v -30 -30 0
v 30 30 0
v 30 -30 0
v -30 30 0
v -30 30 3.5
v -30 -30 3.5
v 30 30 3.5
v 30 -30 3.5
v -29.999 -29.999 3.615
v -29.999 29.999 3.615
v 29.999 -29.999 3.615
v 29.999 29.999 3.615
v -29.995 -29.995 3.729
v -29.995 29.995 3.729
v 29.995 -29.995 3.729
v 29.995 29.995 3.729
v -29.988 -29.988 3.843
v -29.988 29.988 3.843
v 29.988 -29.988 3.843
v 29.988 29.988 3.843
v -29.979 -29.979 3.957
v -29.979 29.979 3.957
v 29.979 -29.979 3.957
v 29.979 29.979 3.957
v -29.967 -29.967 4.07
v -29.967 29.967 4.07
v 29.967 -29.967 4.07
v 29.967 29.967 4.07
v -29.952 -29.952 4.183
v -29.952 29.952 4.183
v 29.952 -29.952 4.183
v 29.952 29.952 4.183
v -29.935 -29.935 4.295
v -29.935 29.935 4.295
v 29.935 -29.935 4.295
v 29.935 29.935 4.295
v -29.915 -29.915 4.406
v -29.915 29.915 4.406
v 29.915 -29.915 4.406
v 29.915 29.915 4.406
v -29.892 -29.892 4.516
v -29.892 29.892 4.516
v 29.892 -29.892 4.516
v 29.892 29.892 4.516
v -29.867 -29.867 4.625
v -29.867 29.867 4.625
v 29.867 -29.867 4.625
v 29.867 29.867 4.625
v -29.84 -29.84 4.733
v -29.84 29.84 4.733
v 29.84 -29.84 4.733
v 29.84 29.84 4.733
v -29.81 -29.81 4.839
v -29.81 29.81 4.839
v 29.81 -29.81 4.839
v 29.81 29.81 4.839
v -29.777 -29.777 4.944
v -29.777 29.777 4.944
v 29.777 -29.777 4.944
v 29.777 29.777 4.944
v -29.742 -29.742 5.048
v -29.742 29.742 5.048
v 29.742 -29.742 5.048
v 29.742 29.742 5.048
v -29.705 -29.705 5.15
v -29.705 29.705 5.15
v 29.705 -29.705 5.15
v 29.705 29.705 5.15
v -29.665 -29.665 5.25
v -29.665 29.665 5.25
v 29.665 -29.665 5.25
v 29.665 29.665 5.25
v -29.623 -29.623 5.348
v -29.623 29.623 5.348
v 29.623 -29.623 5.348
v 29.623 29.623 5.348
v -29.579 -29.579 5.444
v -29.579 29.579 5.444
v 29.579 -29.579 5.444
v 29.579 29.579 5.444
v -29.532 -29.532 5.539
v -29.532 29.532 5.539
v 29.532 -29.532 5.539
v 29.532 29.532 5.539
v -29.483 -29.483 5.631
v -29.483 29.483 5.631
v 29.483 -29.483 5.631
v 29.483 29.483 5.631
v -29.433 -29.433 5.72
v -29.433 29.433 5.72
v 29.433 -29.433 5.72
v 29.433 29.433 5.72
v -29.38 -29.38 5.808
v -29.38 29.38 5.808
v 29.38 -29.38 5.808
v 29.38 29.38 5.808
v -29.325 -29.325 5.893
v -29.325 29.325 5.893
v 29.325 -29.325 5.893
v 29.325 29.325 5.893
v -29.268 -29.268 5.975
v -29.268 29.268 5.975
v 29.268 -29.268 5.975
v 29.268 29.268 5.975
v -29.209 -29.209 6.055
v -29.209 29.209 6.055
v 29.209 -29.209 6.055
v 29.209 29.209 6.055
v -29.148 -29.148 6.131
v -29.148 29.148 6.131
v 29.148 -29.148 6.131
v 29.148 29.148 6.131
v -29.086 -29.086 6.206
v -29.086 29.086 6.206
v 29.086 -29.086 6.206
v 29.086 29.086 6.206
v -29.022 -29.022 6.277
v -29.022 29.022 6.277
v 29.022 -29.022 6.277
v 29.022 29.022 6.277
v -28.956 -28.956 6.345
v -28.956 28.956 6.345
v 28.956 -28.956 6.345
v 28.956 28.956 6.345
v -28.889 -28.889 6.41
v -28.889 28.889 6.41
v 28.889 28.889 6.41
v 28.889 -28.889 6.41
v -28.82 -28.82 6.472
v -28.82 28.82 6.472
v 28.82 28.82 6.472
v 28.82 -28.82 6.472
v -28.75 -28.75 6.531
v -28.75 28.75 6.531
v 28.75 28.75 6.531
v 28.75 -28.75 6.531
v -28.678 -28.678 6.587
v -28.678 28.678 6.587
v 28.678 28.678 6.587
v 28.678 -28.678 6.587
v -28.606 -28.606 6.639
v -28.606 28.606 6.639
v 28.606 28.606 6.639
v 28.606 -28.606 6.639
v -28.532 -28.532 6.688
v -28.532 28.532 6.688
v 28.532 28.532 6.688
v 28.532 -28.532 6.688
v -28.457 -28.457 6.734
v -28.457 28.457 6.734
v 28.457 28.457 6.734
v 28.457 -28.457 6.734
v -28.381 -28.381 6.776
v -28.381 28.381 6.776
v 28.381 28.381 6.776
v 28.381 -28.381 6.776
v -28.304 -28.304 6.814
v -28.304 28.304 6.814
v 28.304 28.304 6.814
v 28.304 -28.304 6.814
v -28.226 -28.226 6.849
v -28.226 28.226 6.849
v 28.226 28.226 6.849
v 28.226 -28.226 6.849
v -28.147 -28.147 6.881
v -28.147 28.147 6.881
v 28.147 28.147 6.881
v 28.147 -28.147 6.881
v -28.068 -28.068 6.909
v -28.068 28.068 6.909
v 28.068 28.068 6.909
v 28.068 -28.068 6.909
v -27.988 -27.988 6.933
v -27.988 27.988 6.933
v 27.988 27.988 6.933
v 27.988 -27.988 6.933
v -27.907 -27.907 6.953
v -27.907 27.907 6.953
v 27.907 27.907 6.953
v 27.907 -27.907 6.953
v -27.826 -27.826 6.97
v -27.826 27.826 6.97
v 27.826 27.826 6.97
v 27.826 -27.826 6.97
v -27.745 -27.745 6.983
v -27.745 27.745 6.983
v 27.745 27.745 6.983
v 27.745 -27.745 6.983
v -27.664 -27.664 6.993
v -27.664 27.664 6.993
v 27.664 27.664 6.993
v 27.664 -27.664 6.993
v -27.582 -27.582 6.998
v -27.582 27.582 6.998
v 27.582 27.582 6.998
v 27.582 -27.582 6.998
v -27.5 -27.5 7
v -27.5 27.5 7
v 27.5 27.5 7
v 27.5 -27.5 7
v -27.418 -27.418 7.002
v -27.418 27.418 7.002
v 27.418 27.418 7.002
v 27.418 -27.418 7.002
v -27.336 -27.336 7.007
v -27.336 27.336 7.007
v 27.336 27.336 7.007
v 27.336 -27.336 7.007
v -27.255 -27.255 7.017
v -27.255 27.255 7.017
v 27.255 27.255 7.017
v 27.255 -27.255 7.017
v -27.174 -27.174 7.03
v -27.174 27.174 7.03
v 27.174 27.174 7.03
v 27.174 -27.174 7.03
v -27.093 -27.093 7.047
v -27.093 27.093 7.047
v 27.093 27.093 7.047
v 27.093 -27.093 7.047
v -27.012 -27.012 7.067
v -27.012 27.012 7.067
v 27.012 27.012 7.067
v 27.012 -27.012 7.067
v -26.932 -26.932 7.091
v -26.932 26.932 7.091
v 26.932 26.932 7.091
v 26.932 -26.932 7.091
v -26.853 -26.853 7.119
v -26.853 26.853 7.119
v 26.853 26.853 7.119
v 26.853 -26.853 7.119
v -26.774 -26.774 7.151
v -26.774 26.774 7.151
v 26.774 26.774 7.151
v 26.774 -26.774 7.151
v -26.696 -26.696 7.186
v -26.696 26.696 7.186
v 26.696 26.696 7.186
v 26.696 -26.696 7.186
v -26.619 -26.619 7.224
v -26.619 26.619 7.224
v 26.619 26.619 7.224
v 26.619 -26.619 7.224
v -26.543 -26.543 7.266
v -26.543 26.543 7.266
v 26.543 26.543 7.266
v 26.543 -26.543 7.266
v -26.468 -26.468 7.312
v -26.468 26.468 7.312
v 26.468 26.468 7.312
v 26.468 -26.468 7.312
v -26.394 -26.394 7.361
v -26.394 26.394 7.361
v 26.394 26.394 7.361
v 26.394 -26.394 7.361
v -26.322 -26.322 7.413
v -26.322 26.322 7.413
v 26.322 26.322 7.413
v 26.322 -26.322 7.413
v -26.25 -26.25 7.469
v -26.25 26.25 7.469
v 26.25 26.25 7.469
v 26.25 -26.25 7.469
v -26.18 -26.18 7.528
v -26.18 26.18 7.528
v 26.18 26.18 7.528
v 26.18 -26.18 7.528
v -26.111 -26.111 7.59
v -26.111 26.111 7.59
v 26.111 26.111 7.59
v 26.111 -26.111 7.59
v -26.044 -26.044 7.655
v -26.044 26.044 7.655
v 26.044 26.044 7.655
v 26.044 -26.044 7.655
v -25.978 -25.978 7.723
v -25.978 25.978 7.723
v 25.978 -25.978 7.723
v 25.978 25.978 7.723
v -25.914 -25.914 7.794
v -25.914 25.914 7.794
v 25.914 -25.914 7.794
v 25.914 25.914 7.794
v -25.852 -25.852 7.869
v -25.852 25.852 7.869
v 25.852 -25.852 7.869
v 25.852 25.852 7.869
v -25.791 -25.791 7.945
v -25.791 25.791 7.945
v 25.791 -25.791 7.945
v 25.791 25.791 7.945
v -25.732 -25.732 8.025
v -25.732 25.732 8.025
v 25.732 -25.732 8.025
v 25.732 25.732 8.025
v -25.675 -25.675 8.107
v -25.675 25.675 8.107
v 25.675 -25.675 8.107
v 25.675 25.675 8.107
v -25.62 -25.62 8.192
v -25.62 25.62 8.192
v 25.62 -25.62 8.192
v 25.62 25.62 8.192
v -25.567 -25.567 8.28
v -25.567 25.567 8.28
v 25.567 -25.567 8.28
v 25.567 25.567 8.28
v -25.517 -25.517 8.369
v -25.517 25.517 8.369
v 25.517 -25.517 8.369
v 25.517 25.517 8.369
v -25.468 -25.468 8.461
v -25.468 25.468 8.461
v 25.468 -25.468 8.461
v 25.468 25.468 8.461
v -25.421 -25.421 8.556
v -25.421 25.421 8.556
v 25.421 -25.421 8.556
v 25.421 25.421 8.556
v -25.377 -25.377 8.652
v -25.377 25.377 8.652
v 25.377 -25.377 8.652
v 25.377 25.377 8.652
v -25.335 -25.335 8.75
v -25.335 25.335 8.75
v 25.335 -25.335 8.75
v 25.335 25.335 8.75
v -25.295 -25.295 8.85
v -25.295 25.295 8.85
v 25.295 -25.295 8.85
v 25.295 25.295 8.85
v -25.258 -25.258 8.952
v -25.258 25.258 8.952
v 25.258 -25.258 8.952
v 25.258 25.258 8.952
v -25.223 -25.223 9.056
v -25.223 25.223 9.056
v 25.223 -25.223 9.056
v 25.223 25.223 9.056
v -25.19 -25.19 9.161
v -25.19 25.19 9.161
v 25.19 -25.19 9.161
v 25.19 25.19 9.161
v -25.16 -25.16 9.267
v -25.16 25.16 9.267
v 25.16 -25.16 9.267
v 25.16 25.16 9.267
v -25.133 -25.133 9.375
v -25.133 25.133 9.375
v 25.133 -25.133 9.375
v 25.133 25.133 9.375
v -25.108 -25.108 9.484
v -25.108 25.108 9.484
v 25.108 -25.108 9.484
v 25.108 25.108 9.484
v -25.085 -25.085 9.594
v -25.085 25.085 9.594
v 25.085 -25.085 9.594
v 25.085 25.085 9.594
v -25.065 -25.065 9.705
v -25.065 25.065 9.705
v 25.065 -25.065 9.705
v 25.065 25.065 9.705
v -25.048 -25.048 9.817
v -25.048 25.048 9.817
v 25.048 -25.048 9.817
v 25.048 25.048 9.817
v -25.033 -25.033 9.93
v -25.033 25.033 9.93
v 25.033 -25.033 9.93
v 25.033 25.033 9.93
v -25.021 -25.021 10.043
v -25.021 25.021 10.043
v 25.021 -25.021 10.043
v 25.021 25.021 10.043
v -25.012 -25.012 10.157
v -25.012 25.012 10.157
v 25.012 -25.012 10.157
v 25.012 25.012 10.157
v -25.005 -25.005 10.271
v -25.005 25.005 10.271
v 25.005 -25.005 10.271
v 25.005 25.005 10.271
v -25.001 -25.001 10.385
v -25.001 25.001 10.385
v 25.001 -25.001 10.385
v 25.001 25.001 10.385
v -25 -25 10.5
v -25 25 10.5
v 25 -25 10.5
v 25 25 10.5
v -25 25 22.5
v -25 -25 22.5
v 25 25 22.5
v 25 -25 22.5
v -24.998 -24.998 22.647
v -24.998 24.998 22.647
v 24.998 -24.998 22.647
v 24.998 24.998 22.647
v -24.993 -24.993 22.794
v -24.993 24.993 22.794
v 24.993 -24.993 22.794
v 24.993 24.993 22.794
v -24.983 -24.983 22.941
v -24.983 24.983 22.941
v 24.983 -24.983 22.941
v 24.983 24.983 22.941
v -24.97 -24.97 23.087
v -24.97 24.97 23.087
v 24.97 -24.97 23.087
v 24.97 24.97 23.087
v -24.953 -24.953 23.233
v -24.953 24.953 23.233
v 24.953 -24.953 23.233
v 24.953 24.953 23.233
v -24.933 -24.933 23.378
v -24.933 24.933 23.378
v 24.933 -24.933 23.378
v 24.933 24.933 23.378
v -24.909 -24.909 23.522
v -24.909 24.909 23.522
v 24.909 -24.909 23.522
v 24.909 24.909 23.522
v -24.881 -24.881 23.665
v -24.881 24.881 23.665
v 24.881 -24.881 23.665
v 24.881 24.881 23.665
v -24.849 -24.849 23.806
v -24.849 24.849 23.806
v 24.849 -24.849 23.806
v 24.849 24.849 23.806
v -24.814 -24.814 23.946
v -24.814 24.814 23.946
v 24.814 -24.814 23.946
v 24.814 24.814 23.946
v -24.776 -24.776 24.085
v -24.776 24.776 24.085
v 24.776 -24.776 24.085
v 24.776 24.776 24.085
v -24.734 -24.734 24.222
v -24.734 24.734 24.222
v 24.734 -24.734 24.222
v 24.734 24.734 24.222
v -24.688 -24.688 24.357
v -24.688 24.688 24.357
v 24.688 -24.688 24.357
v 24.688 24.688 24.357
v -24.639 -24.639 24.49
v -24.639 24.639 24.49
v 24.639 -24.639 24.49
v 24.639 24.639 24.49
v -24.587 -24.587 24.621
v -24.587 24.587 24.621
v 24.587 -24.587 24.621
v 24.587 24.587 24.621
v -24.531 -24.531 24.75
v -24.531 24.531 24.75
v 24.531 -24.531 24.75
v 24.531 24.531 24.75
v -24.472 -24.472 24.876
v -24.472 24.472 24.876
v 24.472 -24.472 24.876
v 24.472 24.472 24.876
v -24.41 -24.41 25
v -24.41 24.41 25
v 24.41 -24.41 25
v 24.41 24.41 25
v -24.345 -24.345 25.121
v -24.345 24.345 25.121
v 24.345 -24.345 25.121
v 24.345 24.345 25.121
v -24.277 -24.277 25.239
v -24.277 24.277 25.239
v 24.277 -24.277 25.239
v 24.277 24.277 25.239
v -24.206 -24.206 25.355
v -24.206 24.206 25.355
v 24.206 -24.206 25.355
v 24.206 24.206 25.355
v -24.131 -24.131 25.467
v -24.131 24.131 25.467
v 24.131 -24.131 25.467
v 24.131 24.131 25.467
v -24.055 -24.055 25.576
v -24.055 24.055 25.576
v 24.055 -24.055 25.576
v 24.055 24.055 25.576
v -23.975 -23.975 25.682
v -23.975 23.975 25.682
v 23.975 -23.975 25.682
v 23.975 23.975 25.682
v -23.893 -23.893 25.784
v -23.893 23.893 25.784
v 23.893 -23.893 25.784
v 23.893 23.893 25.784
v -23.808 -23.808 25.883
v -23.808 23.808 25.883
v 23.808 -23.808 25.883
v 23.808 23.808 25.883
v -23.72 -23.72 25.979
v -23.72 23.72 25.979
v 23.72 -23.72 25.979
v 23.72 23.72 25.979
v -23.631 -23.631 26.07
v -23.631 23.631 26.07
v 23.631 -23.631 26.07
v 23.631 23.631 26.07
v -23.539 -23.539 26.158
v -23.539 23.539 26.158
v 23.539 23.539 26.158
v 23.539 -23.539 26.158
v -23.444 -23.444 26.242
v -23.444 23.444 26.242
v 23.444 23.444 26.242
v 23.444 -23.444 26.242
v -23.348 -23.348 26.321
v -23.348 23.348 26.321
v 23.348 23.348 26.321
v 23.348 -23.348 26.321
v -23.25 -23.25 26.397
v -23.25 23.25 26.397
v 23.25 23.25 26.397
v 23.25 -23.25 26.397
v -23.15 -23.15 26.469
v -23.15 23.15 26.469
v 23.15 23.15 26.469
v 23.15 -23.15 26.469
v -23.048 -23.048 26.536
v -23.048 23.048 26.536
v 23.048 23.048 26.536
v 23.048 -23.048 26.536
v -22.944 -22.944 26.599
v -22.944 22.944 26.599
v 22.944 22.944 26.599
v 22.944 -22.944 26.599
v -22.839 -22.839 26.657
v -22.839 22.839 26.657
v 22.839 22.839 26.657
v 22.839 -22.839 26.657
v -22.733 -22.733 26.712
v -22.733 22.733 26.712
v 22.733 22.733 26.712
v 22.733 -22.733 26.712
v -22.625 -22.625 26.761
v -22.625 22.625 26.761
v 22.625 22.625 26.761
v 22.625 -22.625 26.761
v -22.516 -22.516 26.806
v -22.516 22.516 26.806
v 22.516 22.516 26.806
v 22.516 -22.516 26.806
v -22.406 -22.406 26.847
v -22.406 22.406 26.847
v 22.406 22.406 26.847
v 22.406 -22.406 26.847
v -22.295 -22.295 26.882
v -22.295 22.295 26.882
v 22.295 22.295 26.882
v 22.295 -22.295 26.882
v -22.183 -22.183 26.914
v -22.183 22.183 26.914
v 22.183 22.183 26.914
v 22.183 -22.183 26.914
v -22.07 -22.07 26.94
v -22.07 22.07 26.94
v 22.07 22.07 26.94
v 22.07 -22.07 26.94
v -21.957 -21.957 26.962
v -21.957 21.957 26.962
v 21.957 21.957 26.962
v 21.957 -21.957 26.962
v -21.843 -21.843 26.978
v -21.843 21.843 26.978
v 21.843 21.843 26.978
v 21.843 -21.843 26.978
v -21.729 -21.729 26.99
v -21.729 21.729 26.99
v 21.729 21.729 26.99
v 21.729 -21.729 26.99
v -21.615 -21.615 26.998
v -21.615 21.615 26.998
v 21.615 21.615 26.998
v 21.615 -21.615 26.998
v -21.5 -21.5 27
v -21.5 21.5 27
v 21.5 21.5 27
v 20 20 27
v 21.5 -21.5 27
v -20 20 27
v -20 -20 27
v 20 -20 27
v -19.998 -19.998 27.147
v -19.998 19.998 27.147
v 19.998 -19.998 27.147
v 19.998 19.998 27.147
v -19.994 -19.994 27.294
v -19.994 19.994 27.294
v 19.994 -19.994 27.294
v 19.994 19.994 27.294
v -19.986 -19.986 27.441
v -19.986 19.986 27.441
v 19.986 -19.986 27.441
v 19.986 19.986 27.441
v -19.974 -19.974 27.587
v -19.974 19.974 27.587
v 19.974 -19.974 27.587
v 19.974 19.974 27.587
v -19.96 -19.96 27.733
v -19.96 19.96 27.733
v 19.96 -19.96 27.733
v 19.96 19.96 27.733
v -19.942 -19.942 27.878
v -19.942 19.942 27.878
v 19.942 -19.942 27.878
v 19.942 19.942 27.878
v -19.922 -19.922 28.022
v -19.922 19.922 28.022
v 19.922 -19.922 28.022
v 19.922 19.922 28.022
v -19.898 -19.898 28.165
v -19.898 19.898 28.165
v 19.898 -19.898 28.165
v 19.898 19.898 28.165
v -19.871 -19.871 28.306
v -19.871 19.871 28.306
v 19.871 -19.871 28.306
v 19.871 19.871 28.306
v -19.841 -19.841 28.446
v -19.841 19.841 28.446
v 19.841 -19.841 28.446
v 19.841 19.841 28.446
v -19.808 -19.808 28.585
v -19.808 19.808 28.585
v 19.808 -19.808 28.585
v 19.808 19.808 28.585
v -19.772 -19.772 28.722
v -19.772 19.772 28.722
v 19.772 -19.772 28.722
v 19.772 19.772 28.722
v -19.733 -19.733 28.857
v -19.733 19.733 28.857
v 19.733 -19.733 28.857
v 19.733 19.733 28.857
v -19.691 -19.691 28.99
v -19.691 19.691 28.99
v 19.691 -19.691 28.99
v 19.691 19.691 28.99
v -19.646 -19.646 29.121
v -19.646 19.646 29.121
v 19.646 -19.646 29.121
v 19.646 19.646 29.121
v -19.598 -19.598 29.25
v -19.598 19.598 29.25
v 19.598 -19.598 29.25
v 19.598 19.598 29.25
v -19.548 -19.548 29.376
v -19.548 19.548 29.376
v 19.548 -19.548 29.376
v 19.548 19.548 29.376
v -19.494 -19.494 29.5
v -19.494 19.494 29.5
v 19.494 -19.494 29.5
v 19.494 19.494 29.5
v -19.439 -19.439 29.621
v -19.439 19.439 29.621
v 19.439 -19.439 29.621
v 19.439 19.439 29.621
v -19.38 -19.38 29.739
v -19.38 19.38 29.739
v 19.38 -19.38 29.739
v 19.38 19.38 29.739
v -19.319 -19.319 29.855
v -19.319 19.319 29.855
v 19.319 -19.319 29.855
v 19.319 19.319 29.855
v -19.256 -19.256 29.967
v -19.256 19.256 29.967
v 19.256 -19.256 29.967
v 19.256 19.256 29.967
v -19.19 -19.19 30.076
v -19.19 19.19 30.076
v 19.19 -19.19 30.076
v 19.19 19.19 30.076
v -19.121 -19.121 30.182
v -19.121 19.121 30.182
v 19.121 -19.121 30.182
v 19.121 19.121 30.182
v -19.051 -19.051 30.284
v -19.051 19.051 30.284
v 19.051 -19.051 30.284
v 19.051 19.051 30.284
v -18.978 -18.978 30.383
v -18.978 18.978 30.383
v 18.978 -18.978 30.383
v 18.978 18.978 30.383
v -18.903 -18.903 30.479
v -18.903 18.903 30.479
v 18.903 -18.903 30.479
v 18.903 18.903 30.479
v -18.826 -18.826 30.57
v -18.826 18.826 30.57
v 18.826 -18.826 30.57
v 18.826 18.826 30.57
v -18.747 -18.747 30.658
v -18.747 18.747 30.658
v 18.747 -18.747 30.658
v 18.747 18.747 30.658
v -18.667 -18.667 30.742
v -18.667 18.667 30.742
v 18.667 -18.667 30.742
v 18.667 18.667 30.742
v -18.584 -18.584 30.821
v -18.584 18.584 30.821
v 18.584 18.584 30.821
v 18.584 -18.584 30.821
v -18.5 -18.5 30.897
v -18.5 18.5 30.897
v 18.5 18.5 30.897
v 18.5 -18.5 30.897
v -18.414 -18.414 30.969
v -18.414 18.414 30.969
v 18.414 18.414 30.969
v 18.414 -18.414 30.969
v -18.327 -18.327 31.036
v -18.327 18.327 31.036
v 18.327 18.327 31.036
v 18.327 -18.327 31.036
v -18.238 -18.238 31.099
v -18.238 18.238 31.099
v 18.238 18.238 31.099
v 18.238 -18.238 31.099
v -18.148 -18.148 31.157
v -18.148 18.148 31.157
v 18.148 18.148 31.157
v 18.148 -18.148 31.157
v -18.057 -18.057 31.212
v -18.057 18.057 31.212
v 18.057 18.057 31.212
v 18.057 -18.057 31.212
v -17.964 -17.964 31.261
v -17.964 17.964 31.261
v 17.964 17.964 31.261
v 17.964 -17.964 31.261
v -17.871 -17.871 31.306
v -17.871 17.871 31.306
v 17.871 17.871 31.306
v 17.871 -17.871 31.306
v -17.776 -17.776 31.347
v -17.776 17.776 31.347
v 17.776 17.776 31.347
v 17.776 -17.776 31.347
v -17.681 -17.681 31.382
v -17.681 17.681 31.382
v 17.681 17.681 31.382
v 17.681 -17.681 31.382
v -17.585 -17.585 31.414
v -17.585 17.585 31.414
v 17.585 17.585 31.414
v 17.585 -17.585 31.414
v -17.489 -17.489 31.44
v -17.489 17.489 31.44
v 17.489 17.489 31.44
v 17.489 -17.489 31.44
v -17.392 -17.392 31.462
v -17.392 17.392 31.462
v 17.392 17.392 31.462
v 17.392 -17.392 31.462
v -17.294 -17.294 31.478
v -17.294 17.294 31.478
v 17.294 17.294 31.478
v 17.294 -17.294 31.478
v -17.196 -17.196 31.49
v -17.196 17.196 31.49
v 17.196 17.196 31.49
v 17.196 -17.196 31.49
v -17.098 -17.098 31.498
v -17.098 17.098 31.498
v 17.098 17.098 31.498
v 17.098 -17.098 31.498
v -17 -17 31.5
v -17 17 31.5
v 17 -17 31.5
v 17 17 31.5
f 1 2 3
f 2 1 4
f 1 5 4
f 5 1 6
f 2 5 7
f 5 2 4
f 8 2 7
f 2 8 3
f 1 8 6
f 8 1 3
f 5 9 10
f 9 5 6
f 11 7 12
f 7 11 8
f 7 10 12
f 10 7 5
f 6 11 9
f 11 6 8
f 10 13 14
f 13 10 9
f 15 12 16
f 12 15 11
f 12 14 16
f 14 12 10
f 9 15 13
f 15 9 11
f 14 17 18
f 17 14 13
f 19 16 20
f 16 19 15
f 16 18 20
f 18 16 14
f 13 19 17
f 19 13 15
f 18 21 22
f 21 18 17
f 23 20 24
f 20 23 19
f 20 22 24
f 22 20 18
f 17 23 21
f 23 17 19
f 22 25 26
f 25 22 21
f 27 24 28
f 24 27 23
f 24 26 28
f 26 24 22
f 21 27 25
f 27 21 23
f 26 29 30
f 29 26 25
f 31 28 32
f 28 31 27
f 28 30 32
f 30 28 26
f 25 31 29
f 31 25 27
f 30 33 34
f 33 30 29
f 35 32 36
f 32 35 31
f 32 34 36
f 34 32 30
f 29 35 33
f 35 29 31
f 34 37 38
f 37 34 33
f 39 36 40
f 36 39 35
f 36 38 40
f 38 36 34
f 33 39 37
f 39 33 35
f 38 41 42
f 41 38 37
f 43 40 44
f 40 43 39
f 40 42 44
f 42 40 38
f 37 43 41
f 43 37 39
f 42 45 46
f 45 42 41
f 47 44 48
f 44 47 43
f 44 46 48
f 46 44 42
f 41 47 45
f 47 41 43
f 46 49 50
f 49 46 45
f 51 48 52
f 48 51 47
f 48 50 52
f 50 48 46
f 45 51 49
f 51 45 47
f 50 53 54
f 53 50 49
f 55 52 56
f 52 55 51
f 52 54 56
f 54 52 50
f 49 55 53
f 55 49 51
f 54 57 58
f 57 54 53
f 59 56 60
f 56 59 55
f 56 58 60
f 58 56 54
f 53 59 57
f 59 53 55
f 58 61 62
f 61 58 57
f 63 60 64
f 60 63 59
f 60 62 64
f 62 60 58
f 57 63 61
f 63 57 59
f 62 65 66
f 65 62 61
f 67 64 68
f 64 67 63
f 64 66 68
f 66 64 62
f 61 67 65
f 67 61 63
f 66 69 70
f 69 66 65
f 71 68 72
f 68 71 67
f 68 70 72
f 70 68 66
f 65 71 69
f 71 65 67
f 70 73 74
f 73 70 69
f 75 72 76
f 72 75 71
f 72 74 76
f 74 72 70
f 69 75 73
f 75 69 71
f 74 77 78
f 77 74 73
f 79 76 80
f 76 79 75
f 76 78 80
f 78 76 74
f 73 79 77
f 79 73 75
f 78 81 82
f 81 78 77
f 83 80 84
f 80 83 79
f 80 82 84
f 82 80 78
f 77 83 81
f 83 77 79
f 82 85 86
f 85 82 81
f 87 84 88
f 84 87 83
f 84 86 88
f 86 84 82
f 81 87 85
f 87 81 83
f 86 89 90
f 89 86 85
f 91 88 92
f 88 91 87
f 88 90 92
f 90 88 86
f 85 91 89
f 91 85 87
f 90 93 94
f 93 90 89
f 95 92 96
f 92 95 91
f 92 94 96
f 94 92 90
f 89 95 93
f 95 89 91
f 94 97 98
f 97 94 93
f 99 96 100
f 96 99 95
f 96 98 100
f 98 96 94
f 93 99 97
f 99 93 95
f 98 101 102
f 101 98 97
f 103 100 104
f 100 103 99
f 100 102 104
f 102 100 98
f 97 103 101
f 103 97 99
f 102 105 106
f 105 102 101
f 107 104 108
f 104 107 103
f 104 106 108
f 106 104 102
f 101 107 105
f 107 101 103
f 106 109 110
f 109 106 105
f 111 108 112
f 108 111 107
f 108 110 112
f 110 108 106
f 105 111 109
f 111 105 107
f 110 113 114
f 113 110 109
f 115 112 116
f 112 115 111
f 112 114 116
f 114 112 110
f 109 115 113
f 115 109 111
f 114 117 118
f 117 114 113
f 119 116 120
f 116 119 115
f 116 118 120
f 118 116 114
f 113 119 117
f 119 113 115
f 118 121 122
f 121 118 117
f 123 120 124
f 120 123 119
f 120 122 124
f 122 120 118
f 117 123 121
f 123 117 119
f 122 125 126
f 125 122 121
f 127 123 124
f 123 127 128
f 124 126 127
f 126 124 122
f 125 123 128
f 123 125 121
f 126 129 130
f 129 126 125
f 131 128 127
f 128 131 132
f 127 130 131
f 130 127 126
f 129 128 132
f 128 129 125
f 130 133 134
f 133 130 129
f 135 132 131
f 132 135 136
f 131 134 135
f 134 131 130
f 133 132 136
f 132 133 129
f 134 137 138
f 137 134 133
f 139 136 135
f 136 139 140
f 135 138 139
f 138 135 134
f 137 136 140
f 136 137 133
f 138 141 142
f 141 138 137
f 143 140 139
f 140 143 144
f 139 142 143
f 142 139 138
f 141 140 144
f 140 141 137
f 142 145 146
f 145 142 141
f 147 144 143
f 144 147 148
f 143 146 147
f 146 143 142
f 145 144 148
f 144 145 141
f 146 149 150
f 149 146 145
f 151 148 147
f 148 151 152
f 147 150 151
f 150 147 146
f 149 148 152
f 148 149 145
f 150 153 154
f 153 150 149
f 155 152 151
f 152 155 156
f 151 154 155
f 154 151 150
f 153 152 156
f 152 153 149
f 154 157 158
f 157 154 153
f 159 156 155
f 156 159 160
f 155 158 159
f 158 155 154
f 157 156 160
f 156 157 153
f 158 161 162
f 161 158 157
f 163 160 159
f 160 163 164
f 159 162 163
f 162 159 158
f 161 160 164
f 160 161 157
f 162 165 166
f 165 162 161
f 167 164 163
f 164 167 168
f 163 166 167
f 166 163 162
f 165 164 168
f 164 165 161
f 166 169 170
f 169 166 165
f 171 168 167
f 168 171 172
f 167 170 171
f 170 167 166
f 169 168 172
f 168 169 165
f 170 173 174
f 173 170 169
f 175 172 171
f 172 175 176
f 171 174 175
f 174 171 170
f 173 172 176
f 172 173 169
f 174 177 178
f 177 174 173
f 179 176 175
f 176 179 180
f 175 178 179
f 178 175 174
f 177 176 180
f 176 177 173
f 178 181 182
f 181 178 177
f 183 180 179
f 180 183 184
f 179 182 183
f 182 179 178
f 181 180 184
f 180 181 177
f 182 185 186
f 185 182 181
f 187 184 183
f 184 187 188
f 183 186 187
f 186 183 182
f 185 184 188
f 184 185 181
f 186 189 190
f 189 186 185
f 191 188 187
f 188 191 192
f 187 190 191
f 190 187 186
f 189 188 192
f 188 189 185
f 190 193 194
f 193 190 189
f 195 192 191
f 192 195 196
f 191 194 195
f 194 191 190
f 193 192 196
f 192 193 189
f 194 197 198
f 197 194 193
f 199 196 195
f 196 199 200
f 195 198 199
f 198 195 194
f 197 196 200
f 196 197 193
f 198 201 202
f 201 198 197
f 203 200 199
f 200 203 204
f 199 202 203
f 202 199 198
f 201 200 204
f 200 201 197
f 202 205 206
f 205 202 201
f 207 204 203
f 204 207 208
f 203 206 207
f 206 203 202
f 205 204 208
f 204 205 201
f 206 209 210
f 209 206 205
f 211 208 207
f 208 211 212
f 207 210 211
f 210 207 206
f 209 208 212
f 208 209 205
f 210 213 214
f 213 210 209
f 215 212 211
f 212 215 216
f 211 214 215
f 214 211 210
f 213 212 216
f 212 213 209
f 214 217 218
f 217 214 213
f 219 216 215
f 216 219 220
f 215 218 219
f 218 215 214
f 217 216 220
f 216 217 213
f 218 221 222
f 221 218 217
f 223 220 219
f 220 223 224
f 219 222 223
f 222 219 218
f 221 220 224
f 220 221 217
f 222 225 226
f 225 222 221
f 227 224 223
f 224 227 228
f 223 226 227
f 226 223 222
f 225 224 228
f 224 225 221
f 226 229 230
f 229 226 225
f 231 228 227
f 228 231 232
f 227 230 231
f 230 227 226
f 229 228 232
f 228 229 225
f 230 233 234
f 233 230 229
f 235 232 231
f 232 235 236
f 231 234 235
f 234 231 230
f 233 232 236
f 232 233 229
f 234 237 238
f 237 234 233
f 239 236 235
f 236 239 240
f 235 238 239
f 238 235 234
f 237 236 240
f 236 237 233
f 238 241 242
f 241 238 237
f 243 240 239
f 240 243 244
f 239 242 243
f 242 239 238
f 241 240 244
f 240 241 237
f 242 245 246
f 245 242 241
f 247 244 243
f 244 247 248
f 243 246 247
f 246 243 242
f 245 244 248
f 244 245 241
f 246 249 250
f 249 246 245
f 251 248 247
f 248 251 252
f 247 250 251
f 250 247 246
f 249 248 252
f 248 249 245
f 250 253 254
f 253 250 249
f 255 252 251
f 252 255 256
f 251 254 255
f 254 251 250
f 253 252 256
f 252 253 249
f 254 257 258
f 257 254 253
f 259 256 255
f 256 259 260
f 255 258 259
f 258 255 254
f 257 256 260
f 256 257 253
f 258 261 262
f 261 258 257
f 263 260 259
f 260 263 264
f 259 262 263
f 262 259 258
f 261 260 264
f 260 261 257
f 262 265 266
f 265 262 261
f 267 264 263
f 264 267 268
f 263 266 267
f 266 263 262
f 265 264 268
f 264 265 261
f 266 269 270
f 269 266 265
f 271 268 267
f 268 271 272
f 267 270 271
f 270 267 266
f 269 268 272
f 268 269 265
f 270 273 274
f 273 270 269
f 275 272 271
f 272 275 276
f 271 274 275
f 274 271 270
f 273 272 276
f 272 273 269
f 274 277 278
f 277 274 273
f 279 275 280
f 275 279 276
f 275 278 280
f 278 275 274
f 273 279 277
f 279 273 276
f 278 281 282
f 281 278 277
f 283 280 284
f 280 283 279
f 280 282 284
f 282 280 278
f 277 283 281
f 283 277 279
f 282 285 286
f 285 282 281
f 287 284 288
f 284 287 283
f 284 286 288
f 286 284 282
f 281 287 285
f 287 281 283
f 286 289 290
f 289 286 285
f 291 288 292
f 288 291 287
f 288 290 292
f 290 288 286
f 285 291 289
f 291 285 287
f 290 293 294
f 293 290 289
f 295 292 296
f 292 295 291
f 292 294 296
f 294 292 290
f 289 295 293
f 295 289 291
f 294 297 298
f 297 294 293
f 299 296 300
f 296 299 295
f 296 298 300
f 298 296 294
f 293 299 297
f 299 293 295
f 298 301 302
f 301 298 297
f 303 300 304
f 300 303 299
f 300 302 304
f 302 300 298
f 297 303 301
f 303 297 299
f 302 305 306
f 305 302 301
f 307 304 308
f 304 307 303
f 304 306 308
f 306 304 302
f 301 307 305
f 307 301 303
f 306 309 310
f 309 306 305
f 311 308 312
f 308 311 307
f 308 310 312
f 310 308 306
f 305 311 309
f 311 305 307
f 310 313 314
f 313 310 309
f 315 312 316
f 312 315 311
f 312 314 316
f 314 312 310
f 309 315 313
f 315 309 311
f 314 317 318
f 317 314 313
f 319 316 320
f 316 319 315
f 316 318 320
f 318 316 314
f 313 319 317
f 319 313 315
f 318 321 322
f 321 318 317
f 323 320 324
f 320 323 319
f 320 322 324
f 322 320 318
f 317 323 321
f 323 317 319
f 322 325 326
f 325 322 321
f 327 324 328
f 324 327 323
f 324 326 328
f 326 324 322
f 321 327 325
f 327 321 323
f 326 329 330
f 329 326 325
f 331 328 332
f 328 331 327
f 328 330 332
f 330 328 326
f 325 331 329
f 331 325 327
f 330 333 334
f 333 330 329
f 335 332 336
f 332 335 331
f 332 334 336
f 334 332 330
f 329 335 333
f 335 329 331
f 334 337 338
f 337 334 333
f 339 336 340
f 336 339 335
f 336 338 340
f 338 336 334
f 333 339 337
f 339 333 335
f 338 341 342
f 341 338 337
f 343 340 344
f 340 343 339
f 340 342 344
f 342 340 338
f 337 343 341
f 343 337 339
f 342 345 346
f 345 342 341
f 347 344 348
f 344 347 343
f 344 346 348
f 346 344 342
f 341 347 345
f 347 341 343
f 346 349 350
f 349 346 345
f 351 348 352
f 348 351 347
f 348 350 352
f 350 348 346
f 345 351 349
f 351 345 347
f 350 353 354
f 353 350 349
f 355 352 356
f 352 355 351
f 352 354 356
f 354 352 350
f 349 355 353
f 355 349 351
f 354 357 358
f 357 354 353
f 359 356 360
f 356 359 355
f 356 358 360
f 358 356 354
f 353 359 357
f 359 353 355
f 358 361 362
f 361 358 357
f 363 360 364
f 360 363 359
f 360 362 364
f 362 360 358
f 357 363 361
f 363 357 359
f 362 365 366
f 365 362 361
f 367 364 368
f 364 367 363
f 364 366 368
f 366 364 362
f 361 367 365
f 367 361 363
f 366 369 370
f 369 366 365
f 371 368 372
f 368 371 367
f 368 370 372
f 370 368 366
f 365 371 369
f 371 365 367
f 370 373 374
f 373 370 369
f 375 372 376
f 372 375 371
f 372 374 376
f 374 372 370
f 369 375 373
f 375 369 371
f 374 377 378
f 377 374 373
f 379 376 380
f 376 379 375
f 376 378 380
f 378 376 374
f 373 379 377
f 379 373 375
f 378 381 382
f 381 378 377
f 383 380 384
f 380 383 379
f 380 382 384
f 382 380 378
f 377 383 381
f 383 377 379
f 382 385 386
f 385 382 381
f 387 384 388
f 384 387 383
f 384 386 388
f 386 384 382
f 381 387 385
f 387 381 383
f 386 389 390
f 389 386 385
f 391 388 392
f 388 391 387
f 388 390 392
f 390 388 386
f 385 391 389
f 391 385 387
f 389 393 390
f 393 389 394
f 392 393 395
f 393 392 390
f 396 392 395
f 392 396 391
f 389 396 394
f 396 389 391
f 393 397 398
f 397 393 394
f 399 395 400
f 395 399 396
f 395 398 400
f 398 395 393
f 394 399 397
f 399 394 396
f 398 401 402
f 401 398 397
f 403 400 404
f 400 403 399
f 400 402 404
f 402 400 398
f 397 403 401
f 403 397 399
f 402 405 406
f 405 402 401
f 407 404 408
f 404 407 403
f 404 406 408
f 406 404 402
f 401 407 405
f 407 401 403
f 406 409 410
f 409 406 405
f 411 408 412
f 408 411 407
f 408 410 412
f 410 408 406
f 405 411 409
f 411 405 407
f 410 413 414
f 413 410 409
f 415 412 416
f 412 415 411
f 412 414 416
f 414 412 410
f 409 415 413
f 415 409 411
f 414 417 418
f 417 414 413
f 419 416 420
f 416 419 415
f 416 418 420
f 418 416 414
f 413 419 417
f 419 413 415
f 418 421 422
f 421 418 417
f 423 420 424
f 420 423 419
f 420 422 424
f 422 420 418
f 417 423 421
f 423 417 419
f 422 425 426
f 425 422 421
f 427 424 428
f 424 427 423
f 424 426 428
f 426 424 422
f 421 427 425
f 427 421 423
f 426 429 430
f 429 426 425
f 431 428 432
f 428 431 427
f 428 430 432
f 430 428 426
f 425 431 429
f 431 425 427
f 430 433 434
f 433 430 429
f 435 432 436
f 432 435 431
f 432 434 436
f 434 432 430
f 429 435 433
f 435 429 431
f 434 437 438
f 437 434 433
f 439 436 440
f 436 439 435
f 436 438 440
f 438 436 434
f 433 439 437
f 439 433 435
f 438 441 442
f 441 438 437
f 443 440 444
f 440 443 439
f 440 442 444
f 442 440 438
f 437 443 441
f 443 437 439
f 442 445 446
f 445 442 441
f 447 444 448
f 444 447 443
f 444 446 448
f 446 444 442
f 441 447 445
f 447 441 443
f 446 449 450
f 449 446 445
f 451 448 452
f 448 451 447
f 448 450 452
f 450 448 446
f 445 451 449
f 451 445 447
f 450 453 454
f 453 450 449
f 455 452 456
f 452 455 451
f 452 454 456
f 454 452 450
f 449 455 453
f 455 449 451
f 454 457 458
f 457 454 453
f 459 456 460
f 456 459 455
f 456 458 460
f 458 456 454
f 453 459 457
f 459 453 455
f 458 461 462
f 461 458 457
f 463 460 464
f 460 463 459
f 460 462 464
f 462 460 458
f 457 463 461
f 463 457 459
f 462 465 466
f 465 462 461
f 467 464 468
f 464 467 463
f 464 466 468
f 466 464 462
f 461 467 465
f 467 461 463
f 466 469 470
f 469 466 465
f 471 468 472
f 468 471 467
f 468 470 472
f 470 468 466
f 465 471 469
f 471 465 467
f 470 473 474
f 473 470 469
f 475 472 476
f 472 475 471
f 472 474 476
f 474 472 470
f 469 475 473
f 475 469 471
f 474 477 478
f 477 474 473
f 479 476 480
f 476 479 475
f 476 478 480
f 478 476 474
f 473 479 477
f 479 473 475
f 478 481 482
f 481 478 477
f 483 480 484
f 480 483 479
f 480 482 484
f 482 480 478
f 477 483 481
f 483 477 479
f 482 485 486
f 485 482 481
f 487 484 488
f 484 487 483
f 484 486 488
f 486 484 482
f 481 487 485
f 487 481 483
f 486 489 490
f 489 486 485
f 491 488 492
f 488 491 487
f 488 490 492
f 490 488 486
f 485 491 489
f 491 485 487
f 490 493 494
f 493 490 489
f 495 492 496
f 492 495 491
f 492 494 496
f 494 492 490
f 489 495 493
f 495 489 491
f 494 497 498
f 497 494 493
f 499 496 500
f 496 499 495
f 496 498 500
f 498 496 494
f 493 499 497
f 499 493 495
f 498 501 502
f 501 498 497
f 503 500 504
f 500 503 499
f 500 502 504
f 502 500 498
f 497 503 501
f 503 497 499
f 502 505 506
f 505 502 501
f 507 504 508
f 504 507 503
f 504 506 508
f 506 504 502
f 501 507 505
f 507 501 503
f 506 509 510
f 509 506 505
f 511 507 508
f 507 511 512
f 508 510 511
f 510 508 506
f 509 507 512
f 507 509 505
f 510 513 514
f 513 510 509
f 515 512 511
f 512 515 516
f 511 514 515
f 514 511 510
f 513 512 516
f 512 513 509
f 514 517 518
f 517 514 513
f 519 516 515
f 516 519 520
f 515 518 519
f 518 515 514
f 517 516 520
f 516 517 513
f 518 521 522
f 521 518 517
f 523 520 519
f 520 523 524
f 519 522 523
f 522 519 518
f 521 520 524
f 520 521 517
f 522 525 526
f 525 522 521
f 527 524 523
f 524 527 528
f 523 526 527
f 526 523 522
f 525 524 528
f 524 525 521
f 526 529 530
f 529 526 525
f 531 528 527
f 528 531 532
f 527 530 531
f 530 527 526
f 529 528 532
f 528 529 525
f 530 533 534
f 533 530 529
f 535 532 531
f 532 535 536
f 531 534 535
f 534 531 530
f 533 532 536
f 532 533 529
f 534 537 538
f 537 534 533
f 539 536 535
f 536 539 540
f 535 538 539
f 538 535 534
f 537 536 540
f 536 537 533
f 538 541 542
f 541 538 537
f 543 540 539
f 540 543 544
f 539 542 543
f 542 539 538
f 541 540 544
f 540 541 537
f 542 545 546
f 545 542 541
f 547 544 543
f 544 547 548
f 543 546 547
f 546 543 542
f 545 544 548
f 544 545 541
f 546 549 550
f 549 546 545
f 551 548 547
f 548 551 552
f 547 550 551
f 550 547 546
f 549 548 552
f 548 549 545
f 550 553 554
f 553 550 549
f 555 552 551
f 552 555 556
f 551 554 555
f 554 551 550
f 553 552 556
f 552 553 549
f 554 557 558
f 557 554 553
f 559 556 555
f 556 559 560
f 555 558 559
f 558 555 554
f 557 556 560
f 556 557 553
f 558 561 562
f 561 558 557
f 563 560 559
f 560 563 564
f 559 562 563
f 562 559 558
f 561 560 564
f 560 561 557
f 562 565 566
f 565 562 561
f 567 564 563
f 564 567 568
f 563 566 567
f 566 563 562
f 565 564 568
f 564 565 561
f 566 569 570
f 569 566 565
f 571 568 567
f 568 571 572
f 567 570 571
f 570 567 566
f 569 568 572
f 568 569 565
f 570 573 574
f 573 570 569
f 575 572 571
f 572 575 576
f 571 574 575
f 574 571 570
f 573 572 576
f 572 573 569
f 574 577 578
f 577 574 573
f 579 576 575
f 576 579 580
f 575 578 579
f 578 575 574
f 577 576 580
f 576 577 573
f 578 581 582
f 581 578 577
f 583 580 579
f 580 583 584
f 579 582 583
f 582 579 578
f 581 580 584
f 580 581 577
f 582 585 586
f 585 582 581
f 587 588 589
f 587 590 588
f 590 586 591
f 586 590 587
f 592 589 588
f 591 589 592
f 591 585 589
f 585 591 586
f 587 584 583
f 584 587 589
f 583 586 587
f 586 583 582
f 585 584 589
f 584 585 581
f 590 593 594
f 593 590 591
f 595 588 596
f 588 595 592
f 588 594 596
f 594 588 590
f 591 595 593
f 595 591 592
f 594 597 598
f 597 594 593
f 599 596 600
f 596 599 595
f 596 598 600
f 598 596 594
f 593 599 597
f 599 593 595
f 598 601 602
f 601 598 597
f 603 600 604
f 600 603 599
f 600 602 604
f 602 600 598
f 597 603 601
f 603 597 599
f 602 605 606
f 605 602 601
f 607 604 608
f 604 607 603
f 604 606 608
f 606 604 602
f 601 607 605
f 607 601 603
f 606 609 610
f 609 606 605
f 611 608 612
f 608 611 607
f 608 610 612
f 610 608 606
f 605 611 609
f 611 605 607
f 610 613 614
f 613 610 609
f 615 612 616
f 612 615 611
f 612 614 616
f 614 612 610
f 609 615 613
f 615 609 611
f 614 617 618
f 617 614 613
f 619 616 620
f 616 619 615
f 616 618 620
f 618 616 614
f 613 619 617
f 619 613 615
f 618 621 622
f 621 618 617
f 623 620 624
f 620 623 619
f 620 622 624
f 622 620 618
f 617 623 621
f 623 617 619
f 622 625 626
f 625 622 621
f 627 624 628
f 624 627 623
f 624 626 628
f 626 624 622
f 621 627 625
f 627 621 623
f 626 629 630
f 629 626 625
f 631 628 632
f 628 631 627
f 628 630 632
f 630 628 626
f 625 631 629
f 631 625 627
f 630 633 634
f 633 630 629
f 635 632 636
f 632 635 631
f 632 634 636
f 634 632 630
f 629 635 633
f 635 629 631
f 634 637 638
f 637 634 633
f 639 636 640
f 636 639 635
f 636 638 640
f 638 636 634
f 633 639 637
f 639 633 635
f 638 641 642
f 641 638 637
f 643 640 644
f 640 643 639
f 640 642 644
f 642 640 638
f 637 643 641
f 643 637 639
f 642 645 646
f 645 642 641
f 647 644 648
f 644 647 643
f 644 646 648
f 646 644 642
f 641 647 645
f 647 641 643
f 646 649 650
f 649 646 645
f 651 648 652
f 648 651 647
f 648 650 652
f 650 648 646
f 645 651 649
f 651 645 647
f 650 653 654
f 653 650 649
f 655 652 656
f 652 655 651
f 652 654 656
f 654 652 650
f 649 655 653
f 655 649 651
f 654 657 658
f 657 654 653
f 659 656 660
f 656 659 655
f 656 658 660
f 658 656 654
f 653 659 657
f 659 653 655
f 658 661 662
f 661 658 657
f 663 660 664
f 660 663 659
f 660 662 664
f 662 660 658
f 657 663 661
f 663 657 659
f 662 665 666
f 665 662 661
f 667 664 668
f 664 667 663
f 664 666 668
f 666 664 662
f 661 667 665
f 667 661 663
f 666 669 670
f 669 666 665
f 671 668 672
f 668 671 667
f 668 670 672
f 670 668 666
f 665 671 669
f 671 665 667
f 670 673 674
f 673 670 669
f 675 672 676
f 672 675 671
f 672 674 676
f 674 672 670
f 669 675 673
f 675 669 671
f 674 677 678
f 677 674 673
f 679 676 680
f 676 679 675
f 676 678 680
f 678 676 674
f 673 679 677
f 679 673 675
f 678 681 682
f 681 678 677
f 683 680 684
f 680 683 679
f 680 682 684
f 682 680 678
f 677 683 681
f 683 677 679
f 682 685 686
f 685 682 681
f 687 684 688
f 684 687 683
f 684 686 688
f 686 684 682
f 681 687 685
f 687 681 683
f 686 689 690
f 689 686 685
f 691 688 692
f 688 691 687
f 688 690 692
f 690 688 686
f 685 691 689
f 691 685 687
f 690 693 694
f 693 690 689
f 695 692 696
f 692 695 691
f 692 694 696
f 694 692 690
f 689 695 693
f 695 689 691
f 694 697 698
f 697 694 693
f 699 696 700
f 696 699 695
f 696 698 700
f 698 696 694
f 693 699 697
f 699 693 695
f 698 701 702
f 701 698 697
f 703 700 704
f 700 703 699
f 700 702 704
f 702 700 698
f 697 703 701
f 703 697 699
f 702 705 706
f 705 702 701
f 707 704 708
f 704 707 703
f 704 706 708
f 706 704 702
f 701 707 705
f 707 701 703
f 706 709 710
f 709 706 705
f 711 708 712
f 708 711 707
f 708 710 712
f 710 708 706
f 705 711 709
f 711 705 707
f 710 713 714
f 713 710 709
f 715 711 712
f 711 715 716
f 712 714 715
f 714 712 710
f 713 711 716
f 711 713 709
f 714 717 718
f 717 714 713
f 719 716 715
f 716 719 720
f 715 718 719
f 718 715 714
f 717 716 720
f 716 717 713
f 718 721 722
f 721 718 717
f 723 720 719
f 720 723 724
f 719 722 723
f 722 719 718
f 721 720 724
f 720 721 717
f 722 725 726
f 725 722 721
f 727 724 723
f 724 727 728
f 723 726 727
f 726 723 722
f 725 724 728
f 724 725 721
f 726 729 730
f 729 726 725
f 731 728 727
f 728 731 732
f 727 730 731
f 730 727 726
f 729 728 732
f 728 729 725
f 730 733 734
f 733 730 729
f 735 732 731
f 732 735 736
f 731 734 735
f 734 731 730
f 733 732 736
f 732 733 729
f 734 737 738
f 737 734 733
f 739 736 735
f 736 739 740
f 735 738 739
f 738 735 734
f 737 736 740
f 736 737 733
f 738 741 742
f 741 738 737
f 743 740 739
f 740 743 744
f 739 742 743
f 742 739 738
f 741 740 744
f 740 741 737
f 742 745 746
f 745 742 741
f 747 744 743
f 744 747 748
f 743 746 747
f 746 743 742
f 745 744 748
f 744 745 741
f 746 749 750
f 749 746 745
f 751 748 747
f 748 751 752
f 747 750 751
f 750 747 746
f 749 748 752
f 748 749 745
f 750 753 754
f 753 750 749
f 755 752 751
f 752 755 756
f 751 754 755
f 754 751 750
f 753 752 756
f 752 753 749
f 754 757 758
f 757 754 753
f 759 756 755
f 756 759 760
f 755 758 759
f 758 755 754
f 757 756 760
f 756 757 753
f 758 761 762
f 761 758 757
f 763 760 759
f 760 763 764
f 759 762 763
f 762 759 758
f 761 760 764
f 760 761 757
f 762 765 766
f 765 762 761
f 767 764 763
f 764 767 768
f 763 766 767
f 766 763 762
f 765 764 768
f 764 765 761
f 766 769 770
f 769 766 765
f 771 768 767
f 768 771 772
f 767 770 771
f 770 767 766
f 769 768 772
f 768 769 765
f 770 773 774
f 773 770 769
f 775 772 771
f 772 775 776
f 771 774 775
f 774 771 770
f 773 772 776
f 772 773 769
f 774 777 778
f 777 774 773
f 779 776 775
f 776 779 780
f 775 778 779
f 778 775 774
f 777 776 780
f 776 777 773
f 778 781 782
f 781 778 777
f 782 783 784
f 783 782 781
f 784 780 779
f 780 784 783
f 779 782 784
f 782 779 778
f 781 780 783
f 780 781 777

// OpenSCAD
// trophy_base_ogee_minimal.scad
// Square trophy base with an ogee side profile. Bottom-up the side reads:
// ogee S-curve (convex then concave) -> straight riser -> convex top
// molding -> straight inward ledge -> smaller convex molding -> flat
// platform. Square footprint, symmetrical about both XY axes.
// FDM-friendly: largest flat face on the build plate, profile narrows
// monotonically with height so there are no overhangs.

$fn = 100;

// 1. Constants & parameters
base_width   = 60;    // mm, square side at the bottom
total_height = 31.5;  // mm (raised by ogee_foot_h so the foot adds height
                      // instead of eating the platform)

ogee_foot_h  = 3.5; // mm, straight vertical skirt at the very bottom (0 = none)
ogee_h       = 7;   // mm, height of the bottom S-curve (shorter = steeper arcs)
ogee_inset   = 5;   // mm each side pulls in across the ogee
ogee_inflect = 0.5; // fraction of ogee_h at the convex/concave inflection;
                    // raise for a steeper concave, lower for a steeper convex

riser_h      = 12;  // mm, straight vertical shaft above the ogee. There is where any text or logo would be engraved, so this section is taller than the original.

top1_h       = 4.5; // mm, first (larger) convex top molding height
top1_inset   = 3.5; // mm each side pulls in across that molding

ledge_inset  = 1.5; // mm straight horizontal step inward (the shelf)

top2_h       = 4.5;   // mm, second (smaller) convex molding height
top2_inset   = 3;   // mm each side pulls in across that molding
// remaining height -> flat top platform

arc_steps    = 48;  // segments generated per curved profile section

// 2. Derived dimensions
hw0    = base_width / 2;        // half-width at the base
hw1    = hw0 - ogee_inset;     // half-width of the riser
hw_mid = hw0 - ogee_inset / 2; // half-width at the ogee inflection
z_mid  = ogee_h * ogee_inflect;// z of the ogee inflection (above the foot)
conc_h = ogee_h - z_mid;       // height of the concave upper arc
hw2 = hw1 - top1_inset;        // half-width after the first molding
hw3 = hw2 - ledge_inset;       // half-width after the ledge
hw4 = hw3 - top2_inset;        // half-width of the platform

z_ogee0   = ogee_foot_h;                  // foot ends / ogee S-curve begins
z_riser   = z_ogee0 + ogee_h;             // ogee ends / riser begins
z_top1    = z_riser + riser_h;            // riser ends / molding 1 begins
z_ledge   = z_top1 + top1_h;              // molding 1 ends / ledge + molding 2
z_top2    = z_ledge + top2_h;             // molding 2 ends / platform begins
platform_h = total_height - z_top2;

assert(hw4 > 0,         "insets too large: platform half-width <= 0");
assert(platform_h >= 0, "height too small: sections exceed total_height");
assert(ogee_inflect > 0 && ogee_inflect < 1, "ogee_inflect must be between 0 and 1");
assert(ogee_foot_h >= 0, "ogee_foot_h must not be negative");

// 3. Profile (list of [half-width, z], bottom -> top)
//    Ogee bottom convex: quarter-arc, vertical tangent at the foot →
//    horizontal at inflection. Same formula as the upper moldings.
ogee_conv_pts = [ for (i = [0 : arc_steps])
    let (a = 90 * i / arc_steps)
    [ hw0 - (ogee_inset / 2) * (1 - cos(a)), z_ogee0 + z_mid * sin(a) ] ];

//    Ogee upper concave: quarter-arc, horizontal tangent at inflection →
//    vertical at riser (smooth blend into the straight shaft).
ogee_conc_pts = [ for (i = [1 : arc_steps])
    let (a = 90 * i / arc_steps)
    [ hw_mid - (ogee_inset / 2) * sin(a), z_ogee0 + z_mid + conc_h * (1 - cos(a)) ] ];

//    Convex molding 1: vertical tangent at the riser, horizontal at ledge.
top1_pts = [ for (i = [1 : arc_steps])
    let (a = 90 * i / arc_steps)
    [ hw1 - top1_inset * (1 - cos(a)), z_top1 + top1_h * sin(a) ] ];

//    Convex molding 2: horizontal tangent at the ledge, vertical at platform.
top2_pts = [ for (i = [1 : arc_steps])
    let (a = 90 * i / arc_steps)
    [ hw3 - top2_inset * (1 - cos(a)), z_ledge + top2_h * sin(a) ] ];

profile = concat(
    [ [hw0, 0] ],                   // straight vertical foot (skipped if 0)
    ogee_conv_pts,                  // convex lower arc, ends at [hw_mid, z_mid]
    ogee_conc_pts,                  // concave upper arc, ends at [hw1, z_riser]
    [ [hw1, z_top1] ],              // straight riser
    top1_pts,                       // first convex molding, ends [hw2, z_ledge]
    [ [hw3, z_ledge] ],             // straight inward ledge (horizontal step)
    top2_pts,                       // second convex molding, ends [hw4, z_top2]
    [ [hw4, total_height] ]         // flat platform
);

// 4. Component module
//    Each profile pair extrudes a centered square frustum; stacking the
//    frustums sweeps the profile around the square footprint. Horizontal
//    pairs (the ledge) are skipped — their inward step forms the shelf.
module trophy_base_ogee_minimal() {
    for (i = [0 : len(profile) - 2])
        if (profile[i + 1].y > profile[i].y)
            translate([0, 0, profile[i].y])
                linear_extrude(height = profile[i + 1].y - profile[i].y,
                               scale  = profile[i + 1].x / profile[i].x)
                    square(2 * profile[i].x, center = true);
}

// 5. Assembly
//    `show_base` is set by trophy_cup.scad when this file is `include`d.
//    Undefined here means the file is opened standalone -> render.
if (is_undef(show_base) || show_base)
    trophy_base_ogee_minimal();
